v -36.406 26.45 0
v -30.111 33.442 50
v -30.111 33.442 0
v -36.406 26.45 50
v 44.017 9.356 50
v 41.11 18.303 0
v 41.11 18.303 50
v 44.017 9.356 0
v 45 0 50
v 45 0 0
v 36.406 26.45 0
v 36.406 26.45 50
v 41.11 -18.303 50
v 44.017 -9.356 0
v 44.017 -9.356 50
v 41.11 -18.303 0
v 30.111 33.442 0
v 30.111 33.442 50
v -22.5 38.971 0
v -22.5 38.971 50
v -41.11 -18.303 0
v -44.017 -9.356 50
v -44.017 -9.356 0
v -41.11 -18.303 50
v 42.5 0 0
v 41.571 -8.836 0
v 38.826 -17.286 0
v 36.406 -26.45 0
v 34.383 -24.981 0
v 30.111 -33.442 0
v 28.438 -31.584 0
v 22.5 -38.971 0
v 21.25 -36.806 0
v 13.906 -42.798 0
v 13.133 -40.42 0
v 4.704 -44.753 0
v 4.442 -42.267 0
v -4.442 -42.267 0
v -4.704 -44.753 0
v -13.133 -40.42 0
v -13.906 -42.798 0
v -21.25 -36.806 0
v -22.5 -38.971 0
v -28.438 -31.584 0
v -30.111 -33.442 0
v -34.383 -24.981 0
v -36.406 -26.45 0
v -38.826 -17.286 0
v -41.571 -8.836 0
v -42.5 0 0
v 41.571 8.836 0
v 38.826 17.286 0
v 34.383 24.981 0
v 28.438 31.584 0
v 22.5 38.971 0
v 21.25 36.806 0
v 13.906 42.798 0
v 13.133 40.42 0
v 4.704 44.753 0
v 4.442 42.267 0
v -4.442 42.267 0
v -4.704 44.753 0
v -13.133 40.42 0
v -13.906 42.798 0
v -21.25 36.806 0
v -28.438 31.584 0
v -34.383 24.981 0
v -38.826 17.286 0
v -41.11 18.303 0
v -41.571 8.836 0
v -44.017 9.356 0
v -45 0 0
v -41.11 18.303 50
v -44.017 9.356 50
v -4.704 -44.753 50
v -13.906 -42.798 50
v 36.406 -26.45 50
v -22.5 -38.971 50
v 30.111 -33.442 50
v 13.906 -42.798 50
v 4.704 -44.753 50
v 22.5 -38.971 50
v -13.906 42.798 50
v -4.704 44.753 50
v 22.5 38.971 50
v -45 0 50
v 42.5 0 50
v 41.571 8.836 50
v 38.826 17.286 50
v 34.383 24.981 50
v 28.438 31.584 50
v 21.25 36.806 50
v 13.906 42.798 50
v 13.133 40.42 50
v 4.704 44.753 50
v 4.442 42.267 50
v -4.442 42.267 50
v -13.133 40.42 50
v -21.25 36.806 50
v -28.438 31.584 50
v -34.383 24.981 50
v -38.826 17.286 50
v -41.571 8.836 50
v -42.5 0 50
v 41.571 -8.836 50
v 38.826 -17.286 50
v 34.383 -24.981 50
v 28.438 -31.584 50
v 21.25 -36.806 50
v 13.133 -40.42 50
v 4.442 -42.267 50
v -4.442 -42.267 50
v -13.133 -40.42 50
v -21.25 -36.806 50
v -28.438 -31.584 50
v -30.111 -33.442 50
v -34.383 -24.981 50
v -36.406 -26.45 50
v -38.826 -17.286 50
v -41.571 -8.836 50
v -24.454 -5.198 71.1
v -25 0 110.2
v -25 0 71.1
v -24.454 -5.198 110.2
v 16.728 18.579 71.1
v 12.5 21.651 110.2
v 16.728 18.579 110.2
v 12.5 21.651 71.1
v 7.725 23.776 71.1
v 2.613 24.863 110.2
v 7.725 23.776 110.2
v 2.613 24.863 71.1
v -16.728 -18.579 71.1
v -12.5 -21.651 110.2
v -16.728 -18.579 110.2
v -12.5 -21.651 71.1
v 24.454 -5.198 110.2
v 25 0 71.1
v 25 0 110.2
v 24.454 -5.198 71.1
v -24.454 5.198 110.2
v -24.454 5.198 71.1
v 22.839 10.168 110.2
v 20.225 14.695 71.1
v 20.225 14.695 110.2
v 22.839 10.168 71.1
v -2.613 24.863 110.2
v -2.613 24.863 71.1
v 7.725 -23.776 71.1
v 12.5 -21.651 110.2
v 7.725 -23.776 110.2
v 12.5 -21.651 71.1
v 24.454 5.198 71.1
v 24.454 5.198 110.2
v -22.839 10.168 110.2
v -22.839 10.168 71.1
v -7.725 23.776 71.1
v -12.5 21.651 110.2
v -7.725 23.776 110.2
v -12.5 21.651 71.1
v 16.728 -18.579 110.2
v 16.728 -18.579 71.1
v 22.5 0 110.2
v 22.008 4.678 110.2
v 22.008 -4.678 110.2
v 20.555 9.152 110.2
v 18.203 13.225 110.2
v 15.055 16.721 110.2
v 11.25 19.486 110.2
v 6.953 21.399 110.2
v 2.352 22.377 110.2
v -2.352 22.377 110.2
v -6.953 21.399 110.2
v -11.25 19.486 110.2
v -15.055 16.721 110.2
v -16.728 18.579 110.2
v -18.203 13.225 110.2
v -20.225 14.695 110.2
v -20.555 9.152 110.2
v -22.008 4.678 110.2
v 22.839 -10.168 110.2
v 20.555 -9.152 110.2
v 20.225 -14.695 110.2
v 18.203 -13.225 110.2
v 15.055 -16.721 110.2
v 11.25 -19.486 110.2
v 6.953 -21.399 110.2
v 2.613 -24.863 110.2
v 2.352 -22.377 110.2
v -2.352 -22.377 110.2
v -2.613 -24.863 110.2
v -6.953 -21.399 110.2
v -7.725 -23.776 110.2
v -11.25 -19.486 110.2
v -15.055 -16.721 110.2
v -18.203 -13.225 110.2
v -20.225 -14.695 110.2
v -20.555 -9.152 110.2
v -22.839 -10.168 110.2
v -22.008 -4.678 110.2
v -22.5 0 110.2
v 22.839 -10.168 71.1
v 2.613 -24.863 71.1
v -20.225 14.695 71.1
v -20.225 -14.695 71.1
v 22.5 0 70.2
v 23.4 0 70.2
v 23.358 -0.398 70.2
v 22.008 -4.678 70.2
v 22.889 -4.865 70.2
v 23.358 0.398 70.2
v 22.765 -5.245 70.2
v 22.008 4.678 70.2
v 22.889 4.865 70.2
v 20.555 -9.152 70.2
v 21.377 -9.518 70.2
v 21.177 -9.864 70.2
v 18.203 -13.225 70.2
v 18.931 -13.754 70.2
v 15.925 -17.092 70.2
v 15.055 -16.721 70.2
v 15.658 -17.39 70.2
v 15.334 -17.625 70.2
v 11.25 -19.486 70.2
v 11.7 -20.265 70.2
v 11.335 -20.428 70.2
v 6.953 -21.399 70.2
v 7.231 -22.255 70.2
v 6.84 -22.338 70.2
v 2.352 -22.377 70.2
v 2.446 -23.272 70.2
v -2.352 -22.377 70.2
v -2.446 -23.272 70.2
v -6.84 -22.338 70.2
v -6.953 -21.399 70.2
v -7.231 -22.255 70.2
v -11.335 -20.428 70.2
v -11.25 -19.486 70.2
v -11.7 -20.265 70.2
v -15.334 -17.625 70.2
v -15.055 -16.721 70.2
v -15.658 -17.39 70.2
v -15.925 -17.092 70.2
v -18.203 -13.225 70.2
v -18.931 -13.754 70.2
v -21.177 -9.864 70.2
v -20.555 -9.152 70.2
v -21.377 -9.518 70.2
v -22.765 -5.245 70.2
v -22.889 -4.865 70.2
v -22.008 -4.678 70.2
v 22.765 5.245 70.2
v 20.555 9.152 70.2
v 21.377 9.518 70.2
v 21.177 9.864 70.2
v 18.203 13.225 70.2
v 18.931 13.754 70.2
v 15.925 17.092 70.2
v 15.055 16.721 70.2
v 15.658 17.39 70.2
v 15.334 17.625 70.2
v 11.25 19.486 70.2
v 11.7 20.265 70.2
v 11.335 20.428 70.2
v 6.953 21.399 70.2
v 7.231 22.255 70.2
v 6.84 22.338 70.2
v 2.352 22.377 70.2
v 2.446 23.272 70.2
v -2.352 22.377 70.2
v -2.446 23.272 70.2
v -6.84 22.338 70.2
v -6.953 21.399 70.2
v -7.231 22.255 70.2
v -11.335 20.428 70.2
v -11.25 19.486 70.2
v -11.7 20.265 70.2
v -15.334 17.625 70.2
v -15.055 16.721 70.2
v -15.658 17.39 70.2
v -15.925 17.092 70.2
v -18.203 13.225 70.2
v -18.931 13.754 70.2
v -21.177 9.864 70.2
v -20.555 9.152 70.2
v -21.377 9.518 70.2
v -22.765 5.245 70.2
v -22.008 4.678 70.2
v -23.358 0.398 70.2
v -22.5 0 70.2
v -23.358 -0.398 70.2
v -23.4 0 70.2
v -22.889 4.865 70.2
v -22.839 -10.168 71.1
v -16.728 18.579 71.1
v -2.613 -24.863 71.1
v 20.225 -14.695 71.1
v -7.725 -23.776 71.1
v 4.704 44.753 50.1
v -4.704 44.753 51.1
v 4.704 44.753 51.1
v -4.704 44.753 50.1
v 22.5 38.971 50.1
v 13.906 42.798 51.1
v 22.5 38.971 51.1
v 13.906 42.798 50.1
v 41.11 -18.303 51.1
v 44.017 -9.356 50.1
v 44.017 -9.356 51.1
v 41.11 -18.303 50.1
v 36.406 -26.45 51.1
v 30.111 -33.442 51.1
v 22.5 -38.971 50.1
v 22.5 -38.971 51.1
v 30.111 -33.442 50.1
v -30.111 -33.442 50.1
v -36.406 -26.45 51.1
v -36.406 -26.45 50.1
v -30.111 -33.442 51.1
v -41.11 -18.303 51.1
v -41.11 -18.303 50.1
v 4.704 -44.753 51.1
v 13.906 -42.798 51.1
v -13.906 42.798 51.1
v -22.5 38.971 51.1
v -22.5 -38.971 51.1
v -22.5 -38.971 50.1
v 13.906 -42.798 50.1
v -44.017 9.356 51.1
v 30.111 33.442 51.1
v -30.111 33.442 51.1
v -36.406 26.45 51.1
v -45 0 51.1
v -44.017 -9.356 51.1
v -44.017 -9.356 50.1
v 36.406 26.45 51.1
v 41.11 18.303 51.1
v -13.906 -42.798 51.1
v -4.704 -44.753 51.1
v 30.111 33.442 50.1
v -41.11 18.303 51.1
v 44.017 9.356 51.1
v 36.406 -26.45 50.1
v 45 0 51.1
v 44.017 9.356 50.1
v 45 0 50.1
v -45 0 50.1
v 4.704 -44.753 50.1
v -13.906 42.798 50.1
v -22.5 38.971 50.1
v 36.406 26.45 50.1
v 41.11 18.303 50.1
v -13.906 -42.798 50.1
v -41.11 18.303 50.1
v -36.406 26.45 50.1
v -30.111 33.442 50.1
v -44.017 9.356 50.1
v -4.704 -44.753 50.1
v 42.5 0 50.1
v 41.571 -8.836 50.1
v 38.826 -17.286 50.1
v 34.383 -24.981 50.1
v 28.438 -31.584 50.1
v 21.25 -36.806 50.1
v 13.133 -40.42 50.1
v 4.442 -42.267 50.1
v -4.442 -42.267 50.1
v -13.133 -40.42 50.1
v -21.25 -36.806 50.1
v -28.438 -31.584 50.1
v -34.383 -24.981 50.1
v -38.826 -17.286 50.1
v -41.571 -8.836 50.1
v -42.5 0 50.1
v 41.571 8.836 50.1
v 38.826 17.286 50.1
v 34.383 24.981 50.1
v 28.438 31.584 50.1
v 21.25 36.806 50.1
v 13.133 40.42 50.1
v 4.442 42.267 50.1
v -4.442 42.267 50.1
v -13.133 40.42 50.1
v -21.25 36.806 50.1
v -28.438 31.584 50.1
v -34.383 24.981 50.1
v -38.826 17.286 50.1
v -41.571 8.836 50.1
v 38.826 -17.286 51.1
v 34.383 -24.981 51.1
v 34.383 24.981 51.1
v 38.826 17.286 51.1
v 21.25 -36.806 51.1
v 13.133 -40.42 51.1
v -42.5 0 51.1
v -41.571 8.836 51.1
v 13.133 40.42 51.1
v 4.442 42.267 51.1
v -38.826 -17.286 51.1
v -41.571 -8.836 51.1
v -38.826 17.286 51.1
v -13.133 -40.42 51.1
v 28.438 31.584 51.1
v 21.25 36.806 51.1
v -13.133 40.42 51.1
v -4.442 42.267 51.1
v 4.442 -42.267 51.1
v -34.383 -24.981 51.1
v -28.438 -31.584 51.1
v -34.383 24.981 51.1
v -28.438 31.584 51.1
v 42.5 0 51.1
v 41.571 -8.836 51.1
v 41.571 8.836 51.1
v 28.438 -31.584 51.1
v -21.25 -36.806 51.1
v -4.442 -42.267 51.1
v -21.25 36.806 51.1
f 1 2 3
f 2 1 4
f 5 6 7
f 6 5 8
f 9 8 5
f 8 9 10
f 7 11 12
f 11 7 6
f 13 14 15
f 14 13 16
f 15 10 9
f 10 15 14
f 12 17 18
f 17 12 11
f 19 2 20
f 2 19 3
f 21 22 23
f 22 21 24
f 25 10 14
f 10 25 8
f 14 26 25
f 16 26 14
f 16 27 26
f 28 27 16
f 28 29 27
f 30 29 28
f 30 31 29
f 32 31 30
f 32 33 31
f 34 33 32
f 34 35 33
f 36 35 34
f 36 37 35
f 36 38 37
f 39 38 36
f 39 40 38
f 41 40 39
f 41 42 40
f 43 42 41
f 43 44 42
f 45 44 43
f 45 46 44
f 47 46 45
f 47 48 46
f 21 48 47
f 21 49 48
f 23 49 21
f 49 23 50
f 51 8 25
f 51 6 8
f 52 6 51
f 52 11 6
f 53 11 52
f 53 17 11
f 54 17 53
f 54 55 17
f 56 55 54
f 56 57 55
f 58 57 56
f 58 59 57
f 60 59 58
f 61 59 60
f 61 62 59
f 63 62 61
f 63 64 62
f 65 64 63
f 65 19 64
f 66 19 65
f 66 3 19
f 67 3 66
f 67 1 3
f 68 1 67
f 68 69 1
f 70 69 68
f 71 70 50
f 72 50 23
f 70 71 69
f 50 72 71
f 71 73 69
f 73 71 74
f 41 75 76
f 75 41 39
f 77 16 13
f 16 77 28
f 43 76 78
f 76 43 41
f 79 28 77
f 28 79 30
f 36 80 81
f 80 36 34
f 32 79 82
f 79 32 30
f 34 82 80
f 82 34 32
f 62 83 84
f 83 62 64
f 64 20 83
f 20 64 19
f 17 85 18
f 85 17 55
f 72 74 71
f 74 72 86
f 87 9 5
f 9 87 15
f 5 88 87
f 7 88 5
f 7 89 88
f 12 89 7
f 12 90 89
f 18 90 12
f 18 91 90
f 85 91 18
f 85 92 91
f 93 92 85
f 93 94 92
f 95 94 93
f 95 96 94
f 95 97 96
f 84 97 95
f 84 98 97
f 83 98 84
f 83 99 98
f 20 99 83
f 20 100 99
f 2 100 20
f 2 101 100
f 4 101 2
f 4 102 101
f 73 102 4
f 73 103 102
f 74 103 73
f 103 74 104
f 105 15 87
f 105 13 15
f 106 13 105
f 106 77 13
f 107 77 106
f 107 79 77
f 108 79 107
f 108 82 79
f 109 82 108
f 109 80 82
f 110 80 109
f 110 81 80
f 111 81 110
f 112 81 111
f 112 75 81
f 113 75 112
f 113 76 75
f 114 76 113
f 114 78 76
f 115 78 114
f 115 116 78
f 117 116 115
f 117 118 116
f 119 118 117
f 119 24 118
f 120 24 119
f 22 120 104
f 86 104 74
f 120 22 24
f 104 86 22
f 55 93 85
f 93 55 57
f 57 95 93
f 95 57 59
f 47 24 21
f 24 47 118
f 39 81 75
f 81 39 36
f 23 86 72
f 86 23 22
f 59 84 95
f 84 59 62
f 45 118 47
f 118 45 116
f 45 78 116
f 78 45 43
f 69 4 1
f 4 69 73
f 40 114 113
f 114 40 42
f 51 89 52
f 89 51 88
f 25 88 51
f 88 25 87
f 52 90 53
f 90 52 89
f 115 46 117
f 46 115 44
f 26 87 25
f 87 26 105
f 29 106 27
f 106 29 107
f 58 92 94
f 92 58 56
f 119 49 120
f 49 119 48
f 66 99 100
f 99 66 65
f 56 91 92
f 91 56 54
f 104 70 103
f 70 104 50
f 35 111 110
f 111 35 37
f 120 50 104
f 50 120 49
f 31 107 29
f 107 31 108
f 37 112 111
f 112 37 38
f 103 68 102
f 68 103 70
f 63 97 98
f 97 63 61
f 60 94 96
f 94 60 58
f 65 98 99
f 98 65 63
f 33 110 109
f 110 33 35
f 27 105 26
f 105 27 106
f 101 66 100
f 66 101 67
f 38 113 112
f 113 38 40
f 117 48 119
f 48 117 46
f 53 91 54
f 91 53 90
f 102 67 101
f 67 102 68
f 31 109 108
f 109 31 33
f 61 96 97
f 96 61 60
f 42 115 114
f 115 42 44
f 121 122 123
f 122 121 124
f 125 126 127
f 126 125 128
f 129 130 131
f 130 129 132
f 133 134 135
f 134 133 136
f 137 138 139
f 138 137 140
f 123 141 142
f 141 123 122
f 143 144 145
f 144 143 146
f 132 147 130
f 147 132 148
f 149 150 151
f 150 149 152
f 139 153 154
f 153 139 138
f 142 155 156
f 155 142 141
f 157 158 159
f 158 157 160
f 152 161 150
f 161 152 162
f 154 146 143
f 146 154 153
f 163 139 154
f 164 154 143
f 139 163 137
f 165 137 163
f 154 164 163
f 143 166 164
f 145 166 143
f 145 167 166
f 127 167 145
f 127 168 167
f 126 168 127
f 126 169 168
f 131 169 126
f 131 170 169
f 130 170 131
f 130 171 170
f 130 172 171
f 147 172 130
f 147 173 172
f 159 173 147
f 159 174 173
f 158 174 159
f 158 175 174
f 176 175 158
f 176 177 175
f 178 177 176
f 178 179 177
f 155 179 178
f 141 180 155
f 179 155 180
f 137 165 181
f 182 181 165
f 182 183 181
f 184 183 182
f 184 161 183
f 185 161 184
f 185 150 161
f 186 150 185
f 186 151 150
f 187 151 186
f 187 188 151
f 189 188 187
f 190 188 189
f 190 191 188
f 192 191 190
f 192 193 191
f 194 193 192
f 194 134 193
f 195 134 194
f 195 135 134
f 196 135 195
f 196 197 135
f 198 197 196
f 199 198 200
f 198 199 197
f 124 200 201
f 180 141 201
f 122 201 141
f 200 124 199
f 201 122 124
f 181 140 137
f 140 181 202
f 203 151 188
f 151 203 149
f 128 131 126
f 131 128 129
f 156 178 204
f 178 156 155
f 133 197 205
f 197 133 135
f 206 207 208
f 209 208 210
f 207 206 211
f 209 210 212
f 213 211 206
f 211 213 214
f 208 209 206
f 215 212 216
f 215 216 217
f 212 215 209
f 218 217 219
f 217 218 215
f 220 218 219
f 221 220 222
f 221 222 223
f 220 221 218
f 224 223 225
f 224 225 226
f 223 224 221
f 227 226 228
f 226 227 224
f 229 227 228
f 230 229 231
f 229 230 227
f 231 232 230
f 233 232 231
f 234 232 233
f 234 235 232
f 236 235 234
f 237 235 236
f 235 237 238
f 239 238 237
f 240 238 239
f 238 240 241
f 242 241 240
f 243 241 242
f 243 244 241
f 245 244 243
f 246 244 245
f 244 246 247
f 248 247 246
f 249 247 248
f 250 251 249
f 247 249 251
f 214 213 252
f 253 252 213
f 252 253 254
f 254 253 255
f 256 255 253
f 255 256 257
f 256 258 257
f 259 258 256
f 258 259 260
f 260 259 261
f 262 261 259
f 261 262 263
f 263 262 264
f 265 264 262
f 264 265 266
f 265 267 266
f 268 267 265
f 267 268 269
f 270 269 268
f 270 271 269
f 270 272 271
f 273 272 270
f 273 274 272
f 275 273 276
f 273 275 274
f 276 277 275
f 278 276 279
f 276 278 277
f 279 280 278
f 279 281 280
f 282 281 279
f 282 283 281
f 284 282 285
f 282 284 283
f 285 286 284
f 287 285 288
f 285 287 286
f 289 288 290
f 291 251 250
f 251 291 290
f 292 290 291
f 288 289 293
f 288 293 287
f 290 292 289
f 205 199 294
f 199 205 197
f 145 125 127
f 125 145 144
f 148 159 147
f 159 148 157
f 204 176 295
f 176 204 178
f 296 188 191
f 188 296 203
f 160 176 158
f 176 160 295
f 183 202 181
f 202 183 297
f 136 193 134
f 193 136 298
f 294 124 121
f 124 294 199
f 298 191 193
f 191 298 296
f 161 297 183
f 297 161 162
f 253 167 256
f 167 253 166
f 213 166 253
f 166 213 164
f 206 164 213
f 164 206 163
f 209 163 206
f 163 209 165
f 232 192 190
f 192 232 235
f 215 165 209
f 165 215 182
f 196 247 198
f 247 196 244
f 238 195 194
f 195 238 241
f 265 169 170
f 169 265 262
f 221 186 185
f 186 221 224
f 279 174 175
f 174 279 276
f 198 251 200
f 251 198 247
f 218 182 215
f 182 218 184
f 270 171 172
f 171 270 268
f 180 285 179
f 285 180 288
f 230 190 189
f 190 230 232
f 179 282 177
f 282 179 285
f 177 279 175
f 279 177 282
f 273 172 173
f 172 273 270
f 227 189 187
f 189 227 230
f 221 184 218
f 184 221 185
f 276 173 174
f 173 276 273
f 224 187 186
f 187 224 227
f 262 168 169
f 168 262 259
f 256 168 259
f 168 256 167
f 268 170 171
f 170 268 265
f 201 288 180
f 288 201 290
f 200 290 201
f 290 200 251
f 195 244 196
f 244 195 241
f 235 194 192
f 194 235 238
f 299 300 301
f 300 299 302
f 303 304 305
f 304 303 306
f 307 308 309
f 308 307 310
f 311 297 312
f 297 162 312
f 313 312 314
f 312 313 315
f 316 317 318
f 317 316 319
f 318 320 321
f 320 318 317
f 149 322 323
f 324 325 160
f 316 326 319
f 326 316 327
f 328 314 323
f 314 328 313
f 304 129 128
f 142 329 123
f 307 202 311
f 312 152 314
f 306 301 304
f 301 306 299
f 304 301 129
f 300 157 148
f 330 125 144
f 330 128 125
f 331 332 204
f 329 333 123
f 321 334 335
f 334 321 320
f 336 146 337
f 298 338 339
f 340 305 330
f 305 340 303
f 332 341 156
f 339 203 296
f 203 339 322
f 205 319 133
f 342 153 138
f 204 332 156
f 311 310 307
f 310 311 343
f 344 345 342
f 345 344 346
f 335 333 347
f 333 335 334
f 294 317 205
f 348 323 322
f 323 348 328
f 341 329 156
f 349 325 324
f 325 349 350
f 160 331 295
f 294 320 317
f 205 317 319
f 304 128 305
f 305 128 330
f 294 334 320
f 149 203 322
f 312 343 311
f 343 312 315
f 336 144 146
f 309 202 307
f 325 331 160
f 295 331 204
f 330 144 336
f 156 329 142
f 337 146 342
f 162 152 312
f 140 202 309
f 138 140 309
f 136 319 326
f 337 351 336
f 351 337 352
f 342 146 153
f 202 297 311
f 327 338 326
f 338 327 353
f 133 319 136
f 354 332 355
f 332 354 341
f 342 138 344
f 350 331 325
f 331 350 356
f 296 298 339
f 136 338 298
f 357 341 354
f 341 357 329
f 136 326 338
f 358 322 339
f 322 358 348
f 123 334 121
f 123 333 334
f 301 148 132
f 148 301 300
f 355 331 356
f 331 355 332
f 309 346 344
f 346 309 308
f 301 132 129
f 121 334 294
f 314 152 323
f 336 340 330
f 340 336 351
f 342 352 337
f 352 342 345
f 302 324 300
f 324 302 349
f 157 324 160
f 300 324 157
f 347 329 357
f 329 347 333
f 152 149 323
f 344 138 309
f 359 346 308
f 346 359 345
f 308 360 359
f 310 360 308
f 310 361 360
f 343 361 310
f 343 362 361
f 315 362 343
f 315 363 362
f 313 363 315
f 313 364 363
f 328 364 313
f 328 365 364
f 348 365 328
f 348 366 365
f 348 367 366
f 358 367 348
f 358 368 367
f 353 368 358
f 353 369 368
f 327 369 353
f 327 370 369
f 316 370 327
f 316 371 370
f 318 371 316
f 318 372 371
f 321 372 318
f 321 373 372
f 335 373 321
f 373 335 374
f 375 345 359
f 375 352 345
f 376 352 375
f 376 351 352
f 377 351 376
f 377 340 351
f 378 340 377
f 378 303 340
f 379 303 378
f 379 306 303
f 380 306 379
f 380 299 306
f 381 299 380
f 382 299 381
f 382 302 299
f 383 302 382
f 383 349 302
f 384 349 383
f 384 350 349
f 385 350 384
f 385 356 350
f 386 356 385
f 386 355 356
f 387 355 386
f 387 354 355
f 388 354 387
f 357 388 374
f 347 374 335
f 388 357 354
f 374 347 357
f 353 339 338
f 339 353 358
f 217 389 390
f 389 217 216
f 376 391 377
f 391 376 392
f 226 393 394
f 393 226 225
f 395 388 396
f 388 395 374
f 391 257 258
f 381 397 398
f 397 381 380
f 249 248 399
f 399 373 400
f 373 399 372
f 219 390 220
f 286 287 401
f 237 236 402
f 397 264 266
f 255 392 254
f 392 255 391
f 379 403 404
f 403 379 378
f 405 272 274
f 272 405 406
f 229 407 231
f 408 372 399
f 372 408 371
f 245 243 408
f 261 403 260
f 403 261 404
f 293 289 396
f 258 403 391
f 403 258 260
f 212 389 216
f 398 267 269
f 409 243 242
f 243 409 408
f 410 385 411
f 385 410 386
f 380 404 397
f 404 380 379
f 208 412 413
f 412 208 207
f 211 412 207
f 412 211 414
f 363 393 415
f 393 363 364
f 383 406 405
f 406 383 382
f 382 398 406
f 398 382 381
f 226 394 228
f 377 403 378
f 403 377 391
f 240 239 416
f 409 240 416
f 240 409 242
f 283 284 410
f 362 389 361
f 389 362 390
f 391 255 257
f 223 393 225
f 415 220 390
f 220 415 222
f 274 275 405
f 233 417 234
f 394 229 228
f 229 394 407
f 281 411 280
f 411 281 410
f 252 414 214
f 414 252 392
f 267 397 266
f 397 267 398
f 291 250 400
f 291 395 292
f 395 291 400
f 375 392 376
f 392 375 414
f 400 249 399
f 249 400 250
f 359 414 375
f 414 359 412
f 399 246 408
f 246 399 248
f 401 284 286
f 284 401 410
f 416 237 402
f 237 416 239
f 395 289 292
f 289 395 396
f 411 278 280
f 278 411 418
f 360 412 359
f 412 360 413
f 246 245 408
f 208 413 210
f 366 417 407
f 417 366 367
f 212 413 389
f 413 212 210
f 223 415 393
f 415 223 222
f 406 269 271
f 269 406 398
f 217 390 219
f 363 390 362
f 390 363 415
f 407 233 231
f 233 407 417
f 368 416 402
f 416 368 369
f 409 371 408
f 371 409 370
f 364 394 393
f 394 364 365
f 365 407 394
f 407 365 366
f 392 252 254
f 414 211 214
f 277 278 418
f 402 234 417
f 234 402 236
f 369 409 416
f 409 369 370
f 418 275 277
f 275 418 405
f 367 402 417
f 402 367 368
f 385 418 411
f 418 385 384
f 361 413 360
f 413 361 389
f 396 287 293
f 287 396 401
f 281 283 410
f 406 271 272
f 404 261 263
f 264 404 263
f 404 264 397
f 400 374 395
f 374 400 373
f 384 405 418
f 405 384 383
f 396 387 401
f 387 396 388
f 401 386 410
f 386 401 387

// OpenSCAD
union (){
    difference ()
    {
        cylinder (r=45, h=50);
        cylinder (r=42.5, h=50.01);
    }
 
    translate ([0,0,70.2]){
        difference(){
                cylinder (r=25, h=40);
                cylinder (r=22.5, h=40.01);
        }
    }

    translate([0,0,50.1]){
        difference(){
            hull(){
                cylinder(r=45,h=1);
                translate([0,0,20]) cylinder(r=25,h=1);
            }
            hull(){
                cylinder(r=42.5,h=1);
                translate([0,0,20]) cylinder(r=22.5,h=1);
            }
        }
    }
}
